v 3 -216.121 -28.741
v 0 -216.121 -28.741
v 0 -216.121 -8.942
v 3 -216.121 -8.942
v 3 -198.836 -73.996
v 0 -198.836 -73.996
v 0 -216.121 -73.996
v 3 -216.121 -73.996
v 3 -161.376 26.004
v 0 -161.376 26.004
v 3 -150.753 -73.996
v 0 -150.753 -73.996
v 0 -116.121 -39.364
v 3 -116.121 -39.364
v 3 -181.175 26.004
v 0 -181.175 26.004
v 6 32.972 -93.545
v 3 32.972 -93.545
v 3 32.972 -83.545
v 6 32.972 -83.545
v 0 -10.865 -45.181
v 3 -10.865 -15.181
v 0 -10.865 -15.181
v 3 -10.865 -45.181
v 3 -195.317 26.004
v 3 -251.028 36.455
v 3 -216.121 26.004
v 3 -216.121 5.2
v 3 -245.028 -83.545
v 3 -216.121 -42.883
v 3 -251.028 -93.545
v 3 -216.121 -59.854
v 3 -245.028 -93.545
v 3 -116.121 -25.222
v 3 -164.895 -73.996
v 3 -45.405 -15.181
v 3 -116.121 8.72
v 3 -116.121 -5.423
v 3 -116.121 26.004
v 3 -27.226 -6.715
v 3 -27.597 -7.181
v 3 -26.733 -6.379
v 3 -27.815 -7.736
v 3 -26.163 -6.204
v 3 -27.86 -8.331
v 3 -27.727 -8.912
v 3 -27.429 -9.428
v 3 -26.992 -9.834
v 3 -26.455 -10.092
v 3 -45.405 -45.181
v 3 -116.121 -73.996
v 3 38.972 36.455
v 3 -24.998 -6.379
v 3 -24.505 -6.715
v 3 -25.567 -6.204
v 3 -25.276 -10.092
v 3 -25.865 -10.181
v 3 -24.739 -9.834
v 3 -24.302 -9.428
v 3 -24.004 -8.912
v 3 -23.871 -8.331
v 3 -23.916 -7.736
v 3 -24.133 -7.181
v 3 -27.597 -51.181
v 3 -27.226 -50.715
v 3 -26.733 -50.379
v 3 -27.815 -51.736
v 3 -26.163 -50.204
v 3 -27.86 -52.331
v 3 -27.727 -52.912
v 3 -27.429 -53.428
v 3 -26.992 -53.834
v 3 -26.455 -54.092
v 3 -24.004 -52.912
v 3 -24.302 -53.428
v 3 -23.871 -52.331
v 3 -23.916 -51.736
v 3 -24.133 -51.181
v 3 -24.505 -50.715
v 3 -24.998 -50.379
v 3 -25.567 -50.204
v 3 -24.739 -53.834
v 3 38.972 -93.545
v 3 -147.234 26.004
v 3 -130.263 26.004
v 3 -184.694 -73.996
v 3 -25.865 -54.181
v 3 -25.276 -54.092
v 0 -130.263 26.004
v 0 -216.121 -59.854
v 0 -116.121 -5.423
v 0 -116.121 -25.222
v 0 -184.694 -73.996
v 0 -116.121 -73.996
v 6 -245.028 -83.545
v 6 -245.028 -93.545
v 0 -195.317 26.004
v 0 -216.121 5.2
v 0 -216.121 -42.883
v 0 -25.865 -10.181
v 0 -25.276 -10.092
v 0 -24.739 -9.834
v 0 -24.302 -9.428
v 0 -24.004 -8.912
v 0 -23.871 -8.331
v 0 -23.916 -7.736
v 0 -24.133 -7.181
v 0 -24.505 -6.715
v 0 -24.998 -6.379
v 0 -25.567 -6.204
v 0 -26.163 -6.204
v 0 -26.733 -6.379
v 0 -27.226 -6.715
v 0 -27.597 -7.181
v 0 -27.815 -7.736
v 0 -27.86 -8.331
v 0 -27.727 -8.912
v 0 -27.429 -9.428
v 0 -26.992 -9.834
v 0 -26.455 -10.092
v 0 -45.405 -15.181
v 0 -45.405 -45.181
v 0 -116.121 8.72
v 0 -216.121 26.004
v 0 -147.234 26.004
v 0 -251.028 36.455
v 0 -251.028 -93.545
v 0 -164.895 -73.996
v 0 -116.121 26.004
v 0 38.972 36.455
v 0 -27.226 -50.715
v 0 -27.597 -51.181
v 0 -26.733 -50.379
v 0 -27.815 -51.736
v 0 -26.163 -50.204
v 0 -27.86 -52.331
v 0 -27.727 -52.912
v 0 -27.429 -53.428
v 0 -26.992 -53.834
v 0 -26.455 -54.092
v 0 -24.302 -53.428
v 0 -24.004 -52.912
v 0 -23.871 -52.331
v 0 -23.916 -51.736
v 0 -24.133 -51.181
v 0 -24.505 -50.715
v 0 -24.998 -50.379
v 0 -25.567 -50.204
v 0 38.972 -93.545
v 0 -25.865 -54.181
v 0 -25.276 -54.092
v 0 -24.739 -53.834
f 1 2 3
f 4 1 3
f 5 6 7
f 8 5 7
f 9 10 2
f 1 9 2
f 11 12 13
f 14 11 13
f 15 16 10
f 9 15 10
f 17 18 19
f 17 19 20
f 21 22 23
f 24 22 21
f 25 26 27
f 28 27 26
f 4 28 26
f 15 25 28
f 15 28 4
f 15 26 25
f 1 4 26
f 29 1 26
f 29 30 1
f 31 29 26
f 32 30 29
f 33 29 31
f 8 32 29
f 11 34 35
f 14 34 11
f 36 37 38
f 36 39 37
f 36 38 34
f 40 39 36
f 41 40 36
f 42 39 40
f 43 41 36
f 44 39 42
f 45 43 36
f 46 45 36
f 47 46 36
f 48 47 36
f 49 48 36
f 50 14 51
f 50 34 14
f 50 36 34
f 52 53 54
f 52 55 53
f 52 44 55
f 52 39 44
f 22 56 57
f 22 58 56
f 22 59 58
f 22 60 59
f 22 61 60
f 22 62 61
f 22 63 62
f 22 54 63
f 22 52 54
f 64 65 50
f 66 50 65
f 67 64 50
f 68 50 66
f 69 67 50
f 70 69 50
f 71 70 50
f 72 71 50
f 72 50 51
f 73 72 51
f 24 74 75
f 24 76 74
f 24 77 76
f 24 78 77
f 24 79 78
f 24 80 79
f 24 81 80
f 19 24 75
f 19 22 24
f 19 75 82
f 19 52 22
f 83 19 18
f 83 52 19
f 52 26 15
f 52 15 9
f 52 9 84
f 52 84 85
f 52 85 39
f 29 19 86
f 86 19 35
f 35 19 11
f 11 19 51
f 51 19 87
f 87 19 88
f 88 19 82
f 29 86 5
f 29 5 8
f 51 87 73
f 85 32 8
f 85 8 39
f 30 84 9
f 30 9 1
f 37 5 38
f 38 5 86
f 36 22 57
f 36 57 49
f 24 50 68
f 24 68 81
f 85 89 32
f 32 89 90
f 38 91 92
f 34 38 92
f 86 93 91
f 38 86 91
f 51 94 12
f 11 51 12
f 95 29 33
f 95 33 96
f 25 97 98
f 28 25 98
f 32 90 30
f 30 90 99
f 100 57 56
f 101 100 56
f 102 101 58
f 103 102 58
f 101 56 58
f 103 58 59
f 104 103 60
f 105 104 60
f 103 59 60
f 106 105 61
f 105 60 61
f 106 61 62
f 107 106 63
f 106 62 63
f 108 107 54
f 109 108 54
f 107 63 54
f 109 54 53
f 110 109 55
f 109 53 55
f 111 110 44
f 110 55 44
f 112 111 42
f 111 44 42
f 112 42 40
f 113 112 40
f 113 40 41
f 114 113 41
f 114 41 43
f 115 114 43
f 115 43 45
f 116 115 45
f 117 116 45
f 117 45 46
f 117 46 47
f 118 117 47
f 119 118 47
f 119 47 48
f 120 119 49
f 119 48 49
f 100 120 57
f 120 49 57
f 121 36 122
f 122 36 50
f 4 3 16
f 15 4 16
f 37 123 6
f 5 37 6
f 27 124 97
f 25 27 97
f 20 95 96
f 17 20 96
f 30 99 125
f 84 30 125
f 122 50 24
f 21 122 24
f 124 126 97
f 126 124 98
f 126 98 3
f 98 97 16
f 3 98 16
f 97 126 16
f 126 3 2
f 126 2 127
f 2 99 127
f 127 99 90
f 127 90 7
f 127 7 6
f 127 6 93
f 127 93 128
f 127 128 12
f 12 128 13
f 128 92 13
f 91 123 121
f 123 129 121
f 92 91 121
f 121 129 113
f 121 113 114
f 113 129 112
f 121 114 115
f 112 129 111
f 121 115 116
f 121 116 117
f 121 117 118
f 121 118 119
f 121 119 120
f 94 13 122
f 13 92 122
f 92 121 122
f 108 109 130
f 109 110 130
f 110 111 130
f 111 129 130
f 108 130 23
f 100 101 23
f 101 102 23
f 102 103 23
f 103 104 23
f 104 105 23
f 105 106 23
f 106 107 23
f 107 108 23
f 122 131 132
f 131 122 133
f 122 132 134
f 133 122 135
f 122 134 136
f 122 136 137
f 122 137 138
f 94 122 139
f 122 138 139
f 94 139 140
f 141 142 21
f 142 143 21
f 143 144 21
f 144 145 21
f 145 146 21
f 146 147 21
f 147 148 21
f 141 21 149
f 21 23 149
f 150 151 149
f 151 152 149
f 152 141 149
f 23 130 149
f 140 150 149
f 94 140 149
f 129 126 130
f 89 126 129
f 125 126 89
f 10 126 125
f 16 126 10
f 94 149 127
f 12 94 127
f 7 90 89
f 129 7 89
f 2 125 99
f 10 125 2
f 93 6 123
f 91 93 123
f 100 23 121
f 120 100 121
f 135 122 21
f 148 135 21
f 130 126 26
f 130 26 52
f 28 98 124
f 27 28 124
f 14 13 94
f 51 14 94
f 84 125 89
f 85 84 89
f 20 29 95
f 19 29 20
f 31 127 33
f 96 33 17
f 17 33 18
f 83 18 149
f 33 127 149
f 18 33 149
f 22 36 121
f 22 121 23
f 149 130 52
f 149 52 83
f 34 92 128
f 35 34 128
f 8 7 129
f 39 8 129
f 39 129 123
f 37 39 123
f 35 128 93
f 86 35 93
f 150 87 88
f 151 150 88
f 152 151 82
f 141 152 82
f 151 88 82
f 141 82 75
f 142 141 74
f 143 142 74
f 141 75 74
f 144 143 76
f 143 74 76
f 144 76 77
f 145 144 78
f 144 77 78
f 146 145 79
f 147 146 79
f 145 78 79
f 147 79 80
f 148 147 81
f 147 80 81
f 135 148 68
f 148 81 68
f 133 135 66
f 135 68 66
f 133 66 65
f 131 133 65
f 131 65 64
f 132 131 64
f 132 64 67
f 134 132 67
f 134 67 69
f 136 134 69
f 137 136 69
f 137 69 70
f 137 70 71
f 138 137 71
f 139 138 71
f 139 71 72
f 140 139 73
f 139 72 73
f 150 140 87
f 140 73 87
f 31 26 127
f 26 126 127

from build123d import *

# Parameters (mm, degrees)
SKETCH_1_W          = 130
SKETCH_1_H          = 290
EXTRUDE_1_DEPTH     = 3
SKETCH_3_W          = 30
SKETCH_3_H          = 34.54
CUT_EXTRUDE_3_DEPTH = 3
SKETCH_4_R          = 2
CUT_EXTRUDE_4_DEPTH = 3
CUT_EXTRUDE_6_DEPTH = 10
SKETCH_6_W          = 10
SKETCH_6_H          = 290
EXTRUDE_2_DEPTH     = 3
SKETCH_7_W          = 3
SKETCH_7_H          = 10
CUT_EXTRUDE_7_DEPTH = 6
SKETCH_8_W          = 3
SKETCH_8_H          = 10
CUT_EXTRUDE_8_DEPTH = 6


with BuildPart() as part:
    # 草图1 → 凸台-拉伸1 (new body)
    with BuildSketch(Plane(origin=(0, 0, 0), x_dir=(0, 0, -1), z_dir=(1, 0, 0))):
        with Locations((28.545134703, -106.027707237)):
            Rectangle(SKETCH_1_W, SKETCH_1_H)
    extrude(amount=EXTRUDE_1_DEPTH)

    # 草图3 → 切除-拉伸3 (cut)
    with BuildSketch(Plane(origin=(3, 0, 0), x_dir=(0, 0, -1), z_dir=(1, 0, 0))):
        with Locations((30.181306513, -28.135365108)):
            Rectangle(SKETCH_3_W, SKETCH_3_H)
    extrude(amount=-CUT_EXTRUDE_3_DEPTH, mode=Mode.SUBTRACT)

    # 草图4 → 切除-拉伸4 (cut)
    with BuildSketch(Plane(origin=(3, 0, 0), x_dir=(0, 0, -1), z_dir=(1, 0, 0))):
        with Locations((52.181306513, -25.865365108)):
            Circle(SKETCH_4_R)
        with Locations((8.181306513, -25.865365108)):
            Circle(SKETCH_4_R)
    extrude(amount=-CUT_EXTRUDE_4_DEPTH, mode=Mode.SUBTRACT)

    # 草图5 → 切除-拉伸6 (cut)
    with BuildSketch(Plane.ZY):
        Polygon((-73.995657993, -116.121202928), (-73.995657993, -150.753178318), (-39.363682603, -116.121202928), align=None)
        Polygon((-25.221546979, -116.121202928), (-73.995657993, -164.895313942), (-73.995657993, -184.694303815), (-5.422557106, -116.121202928), align=None)
        Polygon((8.719578518, -116.121202928), (-73.995657993, -198.836439439), (-73.995657993, -216.121202928), (26.004342007, -116.121202928), align=None)
        Polygon((26.004342007, -130.263338551), (-59.85352237, -216.121202928), (-42.882959621, -216.121202928), (26.004342007, -147.2339013), align=None)
        Polygon((26.004342007, -161.376036924), (-28.740823997, -216.121202928), (-8.941834124, -216.121202928), (26.004342007, -181.175026797), align=None)
        Polygon((26.004342007, -195.317162421), (5.2003015, -216.121202928), (26.004342007, -216.121202928), align=None)
    extrude(amount=-CUT_EXTRUDE_6_DEPTH, mode=Mode.SUBTRACT)

    # 草图6 → 凸台-拉伸2 (add)
    with BuildSketch(Plane(origin=(3, 0, 0), x_dir=(0, 0, -1), z_dir=(1, 0, 0))):
        with Locations((88.545134703, -106.027707237)):
            Rectangle(SKETCH_6_W, SKETCH_6_H)
    extrude(amount=EXTRUDE_2_DEPTH)

    # 草图7 → 切除-拉伸7 (cut)
    with BuildSketch(Plane(origin=(0, 38.972292763, 0), x_dir=(1, 0, 0), z_dir=(0, 1, 0))):
        with Locations((4.5, 88.545134703)):
            Rectangle(SKETCH_7_W, SKETCH_7_H)
    extrude(amount=-CUT_EXTRUDE_7_DEPTH, mode=Mode.SUBTRACT)

    # 草图8 → 切除-拉伸8 (cut)
    with BuildSketch(Plane.XZ.offset(251.027707237)):
        with Locations((4.5, -88.545134703)):
            Rectangle(SKETCH_8_W, SKETCH_8_H)
    extrude(amount=-CUT_EXTRUDE_8_DEPTH, mode=Mode.SUBTRACT)


solid = part.part
